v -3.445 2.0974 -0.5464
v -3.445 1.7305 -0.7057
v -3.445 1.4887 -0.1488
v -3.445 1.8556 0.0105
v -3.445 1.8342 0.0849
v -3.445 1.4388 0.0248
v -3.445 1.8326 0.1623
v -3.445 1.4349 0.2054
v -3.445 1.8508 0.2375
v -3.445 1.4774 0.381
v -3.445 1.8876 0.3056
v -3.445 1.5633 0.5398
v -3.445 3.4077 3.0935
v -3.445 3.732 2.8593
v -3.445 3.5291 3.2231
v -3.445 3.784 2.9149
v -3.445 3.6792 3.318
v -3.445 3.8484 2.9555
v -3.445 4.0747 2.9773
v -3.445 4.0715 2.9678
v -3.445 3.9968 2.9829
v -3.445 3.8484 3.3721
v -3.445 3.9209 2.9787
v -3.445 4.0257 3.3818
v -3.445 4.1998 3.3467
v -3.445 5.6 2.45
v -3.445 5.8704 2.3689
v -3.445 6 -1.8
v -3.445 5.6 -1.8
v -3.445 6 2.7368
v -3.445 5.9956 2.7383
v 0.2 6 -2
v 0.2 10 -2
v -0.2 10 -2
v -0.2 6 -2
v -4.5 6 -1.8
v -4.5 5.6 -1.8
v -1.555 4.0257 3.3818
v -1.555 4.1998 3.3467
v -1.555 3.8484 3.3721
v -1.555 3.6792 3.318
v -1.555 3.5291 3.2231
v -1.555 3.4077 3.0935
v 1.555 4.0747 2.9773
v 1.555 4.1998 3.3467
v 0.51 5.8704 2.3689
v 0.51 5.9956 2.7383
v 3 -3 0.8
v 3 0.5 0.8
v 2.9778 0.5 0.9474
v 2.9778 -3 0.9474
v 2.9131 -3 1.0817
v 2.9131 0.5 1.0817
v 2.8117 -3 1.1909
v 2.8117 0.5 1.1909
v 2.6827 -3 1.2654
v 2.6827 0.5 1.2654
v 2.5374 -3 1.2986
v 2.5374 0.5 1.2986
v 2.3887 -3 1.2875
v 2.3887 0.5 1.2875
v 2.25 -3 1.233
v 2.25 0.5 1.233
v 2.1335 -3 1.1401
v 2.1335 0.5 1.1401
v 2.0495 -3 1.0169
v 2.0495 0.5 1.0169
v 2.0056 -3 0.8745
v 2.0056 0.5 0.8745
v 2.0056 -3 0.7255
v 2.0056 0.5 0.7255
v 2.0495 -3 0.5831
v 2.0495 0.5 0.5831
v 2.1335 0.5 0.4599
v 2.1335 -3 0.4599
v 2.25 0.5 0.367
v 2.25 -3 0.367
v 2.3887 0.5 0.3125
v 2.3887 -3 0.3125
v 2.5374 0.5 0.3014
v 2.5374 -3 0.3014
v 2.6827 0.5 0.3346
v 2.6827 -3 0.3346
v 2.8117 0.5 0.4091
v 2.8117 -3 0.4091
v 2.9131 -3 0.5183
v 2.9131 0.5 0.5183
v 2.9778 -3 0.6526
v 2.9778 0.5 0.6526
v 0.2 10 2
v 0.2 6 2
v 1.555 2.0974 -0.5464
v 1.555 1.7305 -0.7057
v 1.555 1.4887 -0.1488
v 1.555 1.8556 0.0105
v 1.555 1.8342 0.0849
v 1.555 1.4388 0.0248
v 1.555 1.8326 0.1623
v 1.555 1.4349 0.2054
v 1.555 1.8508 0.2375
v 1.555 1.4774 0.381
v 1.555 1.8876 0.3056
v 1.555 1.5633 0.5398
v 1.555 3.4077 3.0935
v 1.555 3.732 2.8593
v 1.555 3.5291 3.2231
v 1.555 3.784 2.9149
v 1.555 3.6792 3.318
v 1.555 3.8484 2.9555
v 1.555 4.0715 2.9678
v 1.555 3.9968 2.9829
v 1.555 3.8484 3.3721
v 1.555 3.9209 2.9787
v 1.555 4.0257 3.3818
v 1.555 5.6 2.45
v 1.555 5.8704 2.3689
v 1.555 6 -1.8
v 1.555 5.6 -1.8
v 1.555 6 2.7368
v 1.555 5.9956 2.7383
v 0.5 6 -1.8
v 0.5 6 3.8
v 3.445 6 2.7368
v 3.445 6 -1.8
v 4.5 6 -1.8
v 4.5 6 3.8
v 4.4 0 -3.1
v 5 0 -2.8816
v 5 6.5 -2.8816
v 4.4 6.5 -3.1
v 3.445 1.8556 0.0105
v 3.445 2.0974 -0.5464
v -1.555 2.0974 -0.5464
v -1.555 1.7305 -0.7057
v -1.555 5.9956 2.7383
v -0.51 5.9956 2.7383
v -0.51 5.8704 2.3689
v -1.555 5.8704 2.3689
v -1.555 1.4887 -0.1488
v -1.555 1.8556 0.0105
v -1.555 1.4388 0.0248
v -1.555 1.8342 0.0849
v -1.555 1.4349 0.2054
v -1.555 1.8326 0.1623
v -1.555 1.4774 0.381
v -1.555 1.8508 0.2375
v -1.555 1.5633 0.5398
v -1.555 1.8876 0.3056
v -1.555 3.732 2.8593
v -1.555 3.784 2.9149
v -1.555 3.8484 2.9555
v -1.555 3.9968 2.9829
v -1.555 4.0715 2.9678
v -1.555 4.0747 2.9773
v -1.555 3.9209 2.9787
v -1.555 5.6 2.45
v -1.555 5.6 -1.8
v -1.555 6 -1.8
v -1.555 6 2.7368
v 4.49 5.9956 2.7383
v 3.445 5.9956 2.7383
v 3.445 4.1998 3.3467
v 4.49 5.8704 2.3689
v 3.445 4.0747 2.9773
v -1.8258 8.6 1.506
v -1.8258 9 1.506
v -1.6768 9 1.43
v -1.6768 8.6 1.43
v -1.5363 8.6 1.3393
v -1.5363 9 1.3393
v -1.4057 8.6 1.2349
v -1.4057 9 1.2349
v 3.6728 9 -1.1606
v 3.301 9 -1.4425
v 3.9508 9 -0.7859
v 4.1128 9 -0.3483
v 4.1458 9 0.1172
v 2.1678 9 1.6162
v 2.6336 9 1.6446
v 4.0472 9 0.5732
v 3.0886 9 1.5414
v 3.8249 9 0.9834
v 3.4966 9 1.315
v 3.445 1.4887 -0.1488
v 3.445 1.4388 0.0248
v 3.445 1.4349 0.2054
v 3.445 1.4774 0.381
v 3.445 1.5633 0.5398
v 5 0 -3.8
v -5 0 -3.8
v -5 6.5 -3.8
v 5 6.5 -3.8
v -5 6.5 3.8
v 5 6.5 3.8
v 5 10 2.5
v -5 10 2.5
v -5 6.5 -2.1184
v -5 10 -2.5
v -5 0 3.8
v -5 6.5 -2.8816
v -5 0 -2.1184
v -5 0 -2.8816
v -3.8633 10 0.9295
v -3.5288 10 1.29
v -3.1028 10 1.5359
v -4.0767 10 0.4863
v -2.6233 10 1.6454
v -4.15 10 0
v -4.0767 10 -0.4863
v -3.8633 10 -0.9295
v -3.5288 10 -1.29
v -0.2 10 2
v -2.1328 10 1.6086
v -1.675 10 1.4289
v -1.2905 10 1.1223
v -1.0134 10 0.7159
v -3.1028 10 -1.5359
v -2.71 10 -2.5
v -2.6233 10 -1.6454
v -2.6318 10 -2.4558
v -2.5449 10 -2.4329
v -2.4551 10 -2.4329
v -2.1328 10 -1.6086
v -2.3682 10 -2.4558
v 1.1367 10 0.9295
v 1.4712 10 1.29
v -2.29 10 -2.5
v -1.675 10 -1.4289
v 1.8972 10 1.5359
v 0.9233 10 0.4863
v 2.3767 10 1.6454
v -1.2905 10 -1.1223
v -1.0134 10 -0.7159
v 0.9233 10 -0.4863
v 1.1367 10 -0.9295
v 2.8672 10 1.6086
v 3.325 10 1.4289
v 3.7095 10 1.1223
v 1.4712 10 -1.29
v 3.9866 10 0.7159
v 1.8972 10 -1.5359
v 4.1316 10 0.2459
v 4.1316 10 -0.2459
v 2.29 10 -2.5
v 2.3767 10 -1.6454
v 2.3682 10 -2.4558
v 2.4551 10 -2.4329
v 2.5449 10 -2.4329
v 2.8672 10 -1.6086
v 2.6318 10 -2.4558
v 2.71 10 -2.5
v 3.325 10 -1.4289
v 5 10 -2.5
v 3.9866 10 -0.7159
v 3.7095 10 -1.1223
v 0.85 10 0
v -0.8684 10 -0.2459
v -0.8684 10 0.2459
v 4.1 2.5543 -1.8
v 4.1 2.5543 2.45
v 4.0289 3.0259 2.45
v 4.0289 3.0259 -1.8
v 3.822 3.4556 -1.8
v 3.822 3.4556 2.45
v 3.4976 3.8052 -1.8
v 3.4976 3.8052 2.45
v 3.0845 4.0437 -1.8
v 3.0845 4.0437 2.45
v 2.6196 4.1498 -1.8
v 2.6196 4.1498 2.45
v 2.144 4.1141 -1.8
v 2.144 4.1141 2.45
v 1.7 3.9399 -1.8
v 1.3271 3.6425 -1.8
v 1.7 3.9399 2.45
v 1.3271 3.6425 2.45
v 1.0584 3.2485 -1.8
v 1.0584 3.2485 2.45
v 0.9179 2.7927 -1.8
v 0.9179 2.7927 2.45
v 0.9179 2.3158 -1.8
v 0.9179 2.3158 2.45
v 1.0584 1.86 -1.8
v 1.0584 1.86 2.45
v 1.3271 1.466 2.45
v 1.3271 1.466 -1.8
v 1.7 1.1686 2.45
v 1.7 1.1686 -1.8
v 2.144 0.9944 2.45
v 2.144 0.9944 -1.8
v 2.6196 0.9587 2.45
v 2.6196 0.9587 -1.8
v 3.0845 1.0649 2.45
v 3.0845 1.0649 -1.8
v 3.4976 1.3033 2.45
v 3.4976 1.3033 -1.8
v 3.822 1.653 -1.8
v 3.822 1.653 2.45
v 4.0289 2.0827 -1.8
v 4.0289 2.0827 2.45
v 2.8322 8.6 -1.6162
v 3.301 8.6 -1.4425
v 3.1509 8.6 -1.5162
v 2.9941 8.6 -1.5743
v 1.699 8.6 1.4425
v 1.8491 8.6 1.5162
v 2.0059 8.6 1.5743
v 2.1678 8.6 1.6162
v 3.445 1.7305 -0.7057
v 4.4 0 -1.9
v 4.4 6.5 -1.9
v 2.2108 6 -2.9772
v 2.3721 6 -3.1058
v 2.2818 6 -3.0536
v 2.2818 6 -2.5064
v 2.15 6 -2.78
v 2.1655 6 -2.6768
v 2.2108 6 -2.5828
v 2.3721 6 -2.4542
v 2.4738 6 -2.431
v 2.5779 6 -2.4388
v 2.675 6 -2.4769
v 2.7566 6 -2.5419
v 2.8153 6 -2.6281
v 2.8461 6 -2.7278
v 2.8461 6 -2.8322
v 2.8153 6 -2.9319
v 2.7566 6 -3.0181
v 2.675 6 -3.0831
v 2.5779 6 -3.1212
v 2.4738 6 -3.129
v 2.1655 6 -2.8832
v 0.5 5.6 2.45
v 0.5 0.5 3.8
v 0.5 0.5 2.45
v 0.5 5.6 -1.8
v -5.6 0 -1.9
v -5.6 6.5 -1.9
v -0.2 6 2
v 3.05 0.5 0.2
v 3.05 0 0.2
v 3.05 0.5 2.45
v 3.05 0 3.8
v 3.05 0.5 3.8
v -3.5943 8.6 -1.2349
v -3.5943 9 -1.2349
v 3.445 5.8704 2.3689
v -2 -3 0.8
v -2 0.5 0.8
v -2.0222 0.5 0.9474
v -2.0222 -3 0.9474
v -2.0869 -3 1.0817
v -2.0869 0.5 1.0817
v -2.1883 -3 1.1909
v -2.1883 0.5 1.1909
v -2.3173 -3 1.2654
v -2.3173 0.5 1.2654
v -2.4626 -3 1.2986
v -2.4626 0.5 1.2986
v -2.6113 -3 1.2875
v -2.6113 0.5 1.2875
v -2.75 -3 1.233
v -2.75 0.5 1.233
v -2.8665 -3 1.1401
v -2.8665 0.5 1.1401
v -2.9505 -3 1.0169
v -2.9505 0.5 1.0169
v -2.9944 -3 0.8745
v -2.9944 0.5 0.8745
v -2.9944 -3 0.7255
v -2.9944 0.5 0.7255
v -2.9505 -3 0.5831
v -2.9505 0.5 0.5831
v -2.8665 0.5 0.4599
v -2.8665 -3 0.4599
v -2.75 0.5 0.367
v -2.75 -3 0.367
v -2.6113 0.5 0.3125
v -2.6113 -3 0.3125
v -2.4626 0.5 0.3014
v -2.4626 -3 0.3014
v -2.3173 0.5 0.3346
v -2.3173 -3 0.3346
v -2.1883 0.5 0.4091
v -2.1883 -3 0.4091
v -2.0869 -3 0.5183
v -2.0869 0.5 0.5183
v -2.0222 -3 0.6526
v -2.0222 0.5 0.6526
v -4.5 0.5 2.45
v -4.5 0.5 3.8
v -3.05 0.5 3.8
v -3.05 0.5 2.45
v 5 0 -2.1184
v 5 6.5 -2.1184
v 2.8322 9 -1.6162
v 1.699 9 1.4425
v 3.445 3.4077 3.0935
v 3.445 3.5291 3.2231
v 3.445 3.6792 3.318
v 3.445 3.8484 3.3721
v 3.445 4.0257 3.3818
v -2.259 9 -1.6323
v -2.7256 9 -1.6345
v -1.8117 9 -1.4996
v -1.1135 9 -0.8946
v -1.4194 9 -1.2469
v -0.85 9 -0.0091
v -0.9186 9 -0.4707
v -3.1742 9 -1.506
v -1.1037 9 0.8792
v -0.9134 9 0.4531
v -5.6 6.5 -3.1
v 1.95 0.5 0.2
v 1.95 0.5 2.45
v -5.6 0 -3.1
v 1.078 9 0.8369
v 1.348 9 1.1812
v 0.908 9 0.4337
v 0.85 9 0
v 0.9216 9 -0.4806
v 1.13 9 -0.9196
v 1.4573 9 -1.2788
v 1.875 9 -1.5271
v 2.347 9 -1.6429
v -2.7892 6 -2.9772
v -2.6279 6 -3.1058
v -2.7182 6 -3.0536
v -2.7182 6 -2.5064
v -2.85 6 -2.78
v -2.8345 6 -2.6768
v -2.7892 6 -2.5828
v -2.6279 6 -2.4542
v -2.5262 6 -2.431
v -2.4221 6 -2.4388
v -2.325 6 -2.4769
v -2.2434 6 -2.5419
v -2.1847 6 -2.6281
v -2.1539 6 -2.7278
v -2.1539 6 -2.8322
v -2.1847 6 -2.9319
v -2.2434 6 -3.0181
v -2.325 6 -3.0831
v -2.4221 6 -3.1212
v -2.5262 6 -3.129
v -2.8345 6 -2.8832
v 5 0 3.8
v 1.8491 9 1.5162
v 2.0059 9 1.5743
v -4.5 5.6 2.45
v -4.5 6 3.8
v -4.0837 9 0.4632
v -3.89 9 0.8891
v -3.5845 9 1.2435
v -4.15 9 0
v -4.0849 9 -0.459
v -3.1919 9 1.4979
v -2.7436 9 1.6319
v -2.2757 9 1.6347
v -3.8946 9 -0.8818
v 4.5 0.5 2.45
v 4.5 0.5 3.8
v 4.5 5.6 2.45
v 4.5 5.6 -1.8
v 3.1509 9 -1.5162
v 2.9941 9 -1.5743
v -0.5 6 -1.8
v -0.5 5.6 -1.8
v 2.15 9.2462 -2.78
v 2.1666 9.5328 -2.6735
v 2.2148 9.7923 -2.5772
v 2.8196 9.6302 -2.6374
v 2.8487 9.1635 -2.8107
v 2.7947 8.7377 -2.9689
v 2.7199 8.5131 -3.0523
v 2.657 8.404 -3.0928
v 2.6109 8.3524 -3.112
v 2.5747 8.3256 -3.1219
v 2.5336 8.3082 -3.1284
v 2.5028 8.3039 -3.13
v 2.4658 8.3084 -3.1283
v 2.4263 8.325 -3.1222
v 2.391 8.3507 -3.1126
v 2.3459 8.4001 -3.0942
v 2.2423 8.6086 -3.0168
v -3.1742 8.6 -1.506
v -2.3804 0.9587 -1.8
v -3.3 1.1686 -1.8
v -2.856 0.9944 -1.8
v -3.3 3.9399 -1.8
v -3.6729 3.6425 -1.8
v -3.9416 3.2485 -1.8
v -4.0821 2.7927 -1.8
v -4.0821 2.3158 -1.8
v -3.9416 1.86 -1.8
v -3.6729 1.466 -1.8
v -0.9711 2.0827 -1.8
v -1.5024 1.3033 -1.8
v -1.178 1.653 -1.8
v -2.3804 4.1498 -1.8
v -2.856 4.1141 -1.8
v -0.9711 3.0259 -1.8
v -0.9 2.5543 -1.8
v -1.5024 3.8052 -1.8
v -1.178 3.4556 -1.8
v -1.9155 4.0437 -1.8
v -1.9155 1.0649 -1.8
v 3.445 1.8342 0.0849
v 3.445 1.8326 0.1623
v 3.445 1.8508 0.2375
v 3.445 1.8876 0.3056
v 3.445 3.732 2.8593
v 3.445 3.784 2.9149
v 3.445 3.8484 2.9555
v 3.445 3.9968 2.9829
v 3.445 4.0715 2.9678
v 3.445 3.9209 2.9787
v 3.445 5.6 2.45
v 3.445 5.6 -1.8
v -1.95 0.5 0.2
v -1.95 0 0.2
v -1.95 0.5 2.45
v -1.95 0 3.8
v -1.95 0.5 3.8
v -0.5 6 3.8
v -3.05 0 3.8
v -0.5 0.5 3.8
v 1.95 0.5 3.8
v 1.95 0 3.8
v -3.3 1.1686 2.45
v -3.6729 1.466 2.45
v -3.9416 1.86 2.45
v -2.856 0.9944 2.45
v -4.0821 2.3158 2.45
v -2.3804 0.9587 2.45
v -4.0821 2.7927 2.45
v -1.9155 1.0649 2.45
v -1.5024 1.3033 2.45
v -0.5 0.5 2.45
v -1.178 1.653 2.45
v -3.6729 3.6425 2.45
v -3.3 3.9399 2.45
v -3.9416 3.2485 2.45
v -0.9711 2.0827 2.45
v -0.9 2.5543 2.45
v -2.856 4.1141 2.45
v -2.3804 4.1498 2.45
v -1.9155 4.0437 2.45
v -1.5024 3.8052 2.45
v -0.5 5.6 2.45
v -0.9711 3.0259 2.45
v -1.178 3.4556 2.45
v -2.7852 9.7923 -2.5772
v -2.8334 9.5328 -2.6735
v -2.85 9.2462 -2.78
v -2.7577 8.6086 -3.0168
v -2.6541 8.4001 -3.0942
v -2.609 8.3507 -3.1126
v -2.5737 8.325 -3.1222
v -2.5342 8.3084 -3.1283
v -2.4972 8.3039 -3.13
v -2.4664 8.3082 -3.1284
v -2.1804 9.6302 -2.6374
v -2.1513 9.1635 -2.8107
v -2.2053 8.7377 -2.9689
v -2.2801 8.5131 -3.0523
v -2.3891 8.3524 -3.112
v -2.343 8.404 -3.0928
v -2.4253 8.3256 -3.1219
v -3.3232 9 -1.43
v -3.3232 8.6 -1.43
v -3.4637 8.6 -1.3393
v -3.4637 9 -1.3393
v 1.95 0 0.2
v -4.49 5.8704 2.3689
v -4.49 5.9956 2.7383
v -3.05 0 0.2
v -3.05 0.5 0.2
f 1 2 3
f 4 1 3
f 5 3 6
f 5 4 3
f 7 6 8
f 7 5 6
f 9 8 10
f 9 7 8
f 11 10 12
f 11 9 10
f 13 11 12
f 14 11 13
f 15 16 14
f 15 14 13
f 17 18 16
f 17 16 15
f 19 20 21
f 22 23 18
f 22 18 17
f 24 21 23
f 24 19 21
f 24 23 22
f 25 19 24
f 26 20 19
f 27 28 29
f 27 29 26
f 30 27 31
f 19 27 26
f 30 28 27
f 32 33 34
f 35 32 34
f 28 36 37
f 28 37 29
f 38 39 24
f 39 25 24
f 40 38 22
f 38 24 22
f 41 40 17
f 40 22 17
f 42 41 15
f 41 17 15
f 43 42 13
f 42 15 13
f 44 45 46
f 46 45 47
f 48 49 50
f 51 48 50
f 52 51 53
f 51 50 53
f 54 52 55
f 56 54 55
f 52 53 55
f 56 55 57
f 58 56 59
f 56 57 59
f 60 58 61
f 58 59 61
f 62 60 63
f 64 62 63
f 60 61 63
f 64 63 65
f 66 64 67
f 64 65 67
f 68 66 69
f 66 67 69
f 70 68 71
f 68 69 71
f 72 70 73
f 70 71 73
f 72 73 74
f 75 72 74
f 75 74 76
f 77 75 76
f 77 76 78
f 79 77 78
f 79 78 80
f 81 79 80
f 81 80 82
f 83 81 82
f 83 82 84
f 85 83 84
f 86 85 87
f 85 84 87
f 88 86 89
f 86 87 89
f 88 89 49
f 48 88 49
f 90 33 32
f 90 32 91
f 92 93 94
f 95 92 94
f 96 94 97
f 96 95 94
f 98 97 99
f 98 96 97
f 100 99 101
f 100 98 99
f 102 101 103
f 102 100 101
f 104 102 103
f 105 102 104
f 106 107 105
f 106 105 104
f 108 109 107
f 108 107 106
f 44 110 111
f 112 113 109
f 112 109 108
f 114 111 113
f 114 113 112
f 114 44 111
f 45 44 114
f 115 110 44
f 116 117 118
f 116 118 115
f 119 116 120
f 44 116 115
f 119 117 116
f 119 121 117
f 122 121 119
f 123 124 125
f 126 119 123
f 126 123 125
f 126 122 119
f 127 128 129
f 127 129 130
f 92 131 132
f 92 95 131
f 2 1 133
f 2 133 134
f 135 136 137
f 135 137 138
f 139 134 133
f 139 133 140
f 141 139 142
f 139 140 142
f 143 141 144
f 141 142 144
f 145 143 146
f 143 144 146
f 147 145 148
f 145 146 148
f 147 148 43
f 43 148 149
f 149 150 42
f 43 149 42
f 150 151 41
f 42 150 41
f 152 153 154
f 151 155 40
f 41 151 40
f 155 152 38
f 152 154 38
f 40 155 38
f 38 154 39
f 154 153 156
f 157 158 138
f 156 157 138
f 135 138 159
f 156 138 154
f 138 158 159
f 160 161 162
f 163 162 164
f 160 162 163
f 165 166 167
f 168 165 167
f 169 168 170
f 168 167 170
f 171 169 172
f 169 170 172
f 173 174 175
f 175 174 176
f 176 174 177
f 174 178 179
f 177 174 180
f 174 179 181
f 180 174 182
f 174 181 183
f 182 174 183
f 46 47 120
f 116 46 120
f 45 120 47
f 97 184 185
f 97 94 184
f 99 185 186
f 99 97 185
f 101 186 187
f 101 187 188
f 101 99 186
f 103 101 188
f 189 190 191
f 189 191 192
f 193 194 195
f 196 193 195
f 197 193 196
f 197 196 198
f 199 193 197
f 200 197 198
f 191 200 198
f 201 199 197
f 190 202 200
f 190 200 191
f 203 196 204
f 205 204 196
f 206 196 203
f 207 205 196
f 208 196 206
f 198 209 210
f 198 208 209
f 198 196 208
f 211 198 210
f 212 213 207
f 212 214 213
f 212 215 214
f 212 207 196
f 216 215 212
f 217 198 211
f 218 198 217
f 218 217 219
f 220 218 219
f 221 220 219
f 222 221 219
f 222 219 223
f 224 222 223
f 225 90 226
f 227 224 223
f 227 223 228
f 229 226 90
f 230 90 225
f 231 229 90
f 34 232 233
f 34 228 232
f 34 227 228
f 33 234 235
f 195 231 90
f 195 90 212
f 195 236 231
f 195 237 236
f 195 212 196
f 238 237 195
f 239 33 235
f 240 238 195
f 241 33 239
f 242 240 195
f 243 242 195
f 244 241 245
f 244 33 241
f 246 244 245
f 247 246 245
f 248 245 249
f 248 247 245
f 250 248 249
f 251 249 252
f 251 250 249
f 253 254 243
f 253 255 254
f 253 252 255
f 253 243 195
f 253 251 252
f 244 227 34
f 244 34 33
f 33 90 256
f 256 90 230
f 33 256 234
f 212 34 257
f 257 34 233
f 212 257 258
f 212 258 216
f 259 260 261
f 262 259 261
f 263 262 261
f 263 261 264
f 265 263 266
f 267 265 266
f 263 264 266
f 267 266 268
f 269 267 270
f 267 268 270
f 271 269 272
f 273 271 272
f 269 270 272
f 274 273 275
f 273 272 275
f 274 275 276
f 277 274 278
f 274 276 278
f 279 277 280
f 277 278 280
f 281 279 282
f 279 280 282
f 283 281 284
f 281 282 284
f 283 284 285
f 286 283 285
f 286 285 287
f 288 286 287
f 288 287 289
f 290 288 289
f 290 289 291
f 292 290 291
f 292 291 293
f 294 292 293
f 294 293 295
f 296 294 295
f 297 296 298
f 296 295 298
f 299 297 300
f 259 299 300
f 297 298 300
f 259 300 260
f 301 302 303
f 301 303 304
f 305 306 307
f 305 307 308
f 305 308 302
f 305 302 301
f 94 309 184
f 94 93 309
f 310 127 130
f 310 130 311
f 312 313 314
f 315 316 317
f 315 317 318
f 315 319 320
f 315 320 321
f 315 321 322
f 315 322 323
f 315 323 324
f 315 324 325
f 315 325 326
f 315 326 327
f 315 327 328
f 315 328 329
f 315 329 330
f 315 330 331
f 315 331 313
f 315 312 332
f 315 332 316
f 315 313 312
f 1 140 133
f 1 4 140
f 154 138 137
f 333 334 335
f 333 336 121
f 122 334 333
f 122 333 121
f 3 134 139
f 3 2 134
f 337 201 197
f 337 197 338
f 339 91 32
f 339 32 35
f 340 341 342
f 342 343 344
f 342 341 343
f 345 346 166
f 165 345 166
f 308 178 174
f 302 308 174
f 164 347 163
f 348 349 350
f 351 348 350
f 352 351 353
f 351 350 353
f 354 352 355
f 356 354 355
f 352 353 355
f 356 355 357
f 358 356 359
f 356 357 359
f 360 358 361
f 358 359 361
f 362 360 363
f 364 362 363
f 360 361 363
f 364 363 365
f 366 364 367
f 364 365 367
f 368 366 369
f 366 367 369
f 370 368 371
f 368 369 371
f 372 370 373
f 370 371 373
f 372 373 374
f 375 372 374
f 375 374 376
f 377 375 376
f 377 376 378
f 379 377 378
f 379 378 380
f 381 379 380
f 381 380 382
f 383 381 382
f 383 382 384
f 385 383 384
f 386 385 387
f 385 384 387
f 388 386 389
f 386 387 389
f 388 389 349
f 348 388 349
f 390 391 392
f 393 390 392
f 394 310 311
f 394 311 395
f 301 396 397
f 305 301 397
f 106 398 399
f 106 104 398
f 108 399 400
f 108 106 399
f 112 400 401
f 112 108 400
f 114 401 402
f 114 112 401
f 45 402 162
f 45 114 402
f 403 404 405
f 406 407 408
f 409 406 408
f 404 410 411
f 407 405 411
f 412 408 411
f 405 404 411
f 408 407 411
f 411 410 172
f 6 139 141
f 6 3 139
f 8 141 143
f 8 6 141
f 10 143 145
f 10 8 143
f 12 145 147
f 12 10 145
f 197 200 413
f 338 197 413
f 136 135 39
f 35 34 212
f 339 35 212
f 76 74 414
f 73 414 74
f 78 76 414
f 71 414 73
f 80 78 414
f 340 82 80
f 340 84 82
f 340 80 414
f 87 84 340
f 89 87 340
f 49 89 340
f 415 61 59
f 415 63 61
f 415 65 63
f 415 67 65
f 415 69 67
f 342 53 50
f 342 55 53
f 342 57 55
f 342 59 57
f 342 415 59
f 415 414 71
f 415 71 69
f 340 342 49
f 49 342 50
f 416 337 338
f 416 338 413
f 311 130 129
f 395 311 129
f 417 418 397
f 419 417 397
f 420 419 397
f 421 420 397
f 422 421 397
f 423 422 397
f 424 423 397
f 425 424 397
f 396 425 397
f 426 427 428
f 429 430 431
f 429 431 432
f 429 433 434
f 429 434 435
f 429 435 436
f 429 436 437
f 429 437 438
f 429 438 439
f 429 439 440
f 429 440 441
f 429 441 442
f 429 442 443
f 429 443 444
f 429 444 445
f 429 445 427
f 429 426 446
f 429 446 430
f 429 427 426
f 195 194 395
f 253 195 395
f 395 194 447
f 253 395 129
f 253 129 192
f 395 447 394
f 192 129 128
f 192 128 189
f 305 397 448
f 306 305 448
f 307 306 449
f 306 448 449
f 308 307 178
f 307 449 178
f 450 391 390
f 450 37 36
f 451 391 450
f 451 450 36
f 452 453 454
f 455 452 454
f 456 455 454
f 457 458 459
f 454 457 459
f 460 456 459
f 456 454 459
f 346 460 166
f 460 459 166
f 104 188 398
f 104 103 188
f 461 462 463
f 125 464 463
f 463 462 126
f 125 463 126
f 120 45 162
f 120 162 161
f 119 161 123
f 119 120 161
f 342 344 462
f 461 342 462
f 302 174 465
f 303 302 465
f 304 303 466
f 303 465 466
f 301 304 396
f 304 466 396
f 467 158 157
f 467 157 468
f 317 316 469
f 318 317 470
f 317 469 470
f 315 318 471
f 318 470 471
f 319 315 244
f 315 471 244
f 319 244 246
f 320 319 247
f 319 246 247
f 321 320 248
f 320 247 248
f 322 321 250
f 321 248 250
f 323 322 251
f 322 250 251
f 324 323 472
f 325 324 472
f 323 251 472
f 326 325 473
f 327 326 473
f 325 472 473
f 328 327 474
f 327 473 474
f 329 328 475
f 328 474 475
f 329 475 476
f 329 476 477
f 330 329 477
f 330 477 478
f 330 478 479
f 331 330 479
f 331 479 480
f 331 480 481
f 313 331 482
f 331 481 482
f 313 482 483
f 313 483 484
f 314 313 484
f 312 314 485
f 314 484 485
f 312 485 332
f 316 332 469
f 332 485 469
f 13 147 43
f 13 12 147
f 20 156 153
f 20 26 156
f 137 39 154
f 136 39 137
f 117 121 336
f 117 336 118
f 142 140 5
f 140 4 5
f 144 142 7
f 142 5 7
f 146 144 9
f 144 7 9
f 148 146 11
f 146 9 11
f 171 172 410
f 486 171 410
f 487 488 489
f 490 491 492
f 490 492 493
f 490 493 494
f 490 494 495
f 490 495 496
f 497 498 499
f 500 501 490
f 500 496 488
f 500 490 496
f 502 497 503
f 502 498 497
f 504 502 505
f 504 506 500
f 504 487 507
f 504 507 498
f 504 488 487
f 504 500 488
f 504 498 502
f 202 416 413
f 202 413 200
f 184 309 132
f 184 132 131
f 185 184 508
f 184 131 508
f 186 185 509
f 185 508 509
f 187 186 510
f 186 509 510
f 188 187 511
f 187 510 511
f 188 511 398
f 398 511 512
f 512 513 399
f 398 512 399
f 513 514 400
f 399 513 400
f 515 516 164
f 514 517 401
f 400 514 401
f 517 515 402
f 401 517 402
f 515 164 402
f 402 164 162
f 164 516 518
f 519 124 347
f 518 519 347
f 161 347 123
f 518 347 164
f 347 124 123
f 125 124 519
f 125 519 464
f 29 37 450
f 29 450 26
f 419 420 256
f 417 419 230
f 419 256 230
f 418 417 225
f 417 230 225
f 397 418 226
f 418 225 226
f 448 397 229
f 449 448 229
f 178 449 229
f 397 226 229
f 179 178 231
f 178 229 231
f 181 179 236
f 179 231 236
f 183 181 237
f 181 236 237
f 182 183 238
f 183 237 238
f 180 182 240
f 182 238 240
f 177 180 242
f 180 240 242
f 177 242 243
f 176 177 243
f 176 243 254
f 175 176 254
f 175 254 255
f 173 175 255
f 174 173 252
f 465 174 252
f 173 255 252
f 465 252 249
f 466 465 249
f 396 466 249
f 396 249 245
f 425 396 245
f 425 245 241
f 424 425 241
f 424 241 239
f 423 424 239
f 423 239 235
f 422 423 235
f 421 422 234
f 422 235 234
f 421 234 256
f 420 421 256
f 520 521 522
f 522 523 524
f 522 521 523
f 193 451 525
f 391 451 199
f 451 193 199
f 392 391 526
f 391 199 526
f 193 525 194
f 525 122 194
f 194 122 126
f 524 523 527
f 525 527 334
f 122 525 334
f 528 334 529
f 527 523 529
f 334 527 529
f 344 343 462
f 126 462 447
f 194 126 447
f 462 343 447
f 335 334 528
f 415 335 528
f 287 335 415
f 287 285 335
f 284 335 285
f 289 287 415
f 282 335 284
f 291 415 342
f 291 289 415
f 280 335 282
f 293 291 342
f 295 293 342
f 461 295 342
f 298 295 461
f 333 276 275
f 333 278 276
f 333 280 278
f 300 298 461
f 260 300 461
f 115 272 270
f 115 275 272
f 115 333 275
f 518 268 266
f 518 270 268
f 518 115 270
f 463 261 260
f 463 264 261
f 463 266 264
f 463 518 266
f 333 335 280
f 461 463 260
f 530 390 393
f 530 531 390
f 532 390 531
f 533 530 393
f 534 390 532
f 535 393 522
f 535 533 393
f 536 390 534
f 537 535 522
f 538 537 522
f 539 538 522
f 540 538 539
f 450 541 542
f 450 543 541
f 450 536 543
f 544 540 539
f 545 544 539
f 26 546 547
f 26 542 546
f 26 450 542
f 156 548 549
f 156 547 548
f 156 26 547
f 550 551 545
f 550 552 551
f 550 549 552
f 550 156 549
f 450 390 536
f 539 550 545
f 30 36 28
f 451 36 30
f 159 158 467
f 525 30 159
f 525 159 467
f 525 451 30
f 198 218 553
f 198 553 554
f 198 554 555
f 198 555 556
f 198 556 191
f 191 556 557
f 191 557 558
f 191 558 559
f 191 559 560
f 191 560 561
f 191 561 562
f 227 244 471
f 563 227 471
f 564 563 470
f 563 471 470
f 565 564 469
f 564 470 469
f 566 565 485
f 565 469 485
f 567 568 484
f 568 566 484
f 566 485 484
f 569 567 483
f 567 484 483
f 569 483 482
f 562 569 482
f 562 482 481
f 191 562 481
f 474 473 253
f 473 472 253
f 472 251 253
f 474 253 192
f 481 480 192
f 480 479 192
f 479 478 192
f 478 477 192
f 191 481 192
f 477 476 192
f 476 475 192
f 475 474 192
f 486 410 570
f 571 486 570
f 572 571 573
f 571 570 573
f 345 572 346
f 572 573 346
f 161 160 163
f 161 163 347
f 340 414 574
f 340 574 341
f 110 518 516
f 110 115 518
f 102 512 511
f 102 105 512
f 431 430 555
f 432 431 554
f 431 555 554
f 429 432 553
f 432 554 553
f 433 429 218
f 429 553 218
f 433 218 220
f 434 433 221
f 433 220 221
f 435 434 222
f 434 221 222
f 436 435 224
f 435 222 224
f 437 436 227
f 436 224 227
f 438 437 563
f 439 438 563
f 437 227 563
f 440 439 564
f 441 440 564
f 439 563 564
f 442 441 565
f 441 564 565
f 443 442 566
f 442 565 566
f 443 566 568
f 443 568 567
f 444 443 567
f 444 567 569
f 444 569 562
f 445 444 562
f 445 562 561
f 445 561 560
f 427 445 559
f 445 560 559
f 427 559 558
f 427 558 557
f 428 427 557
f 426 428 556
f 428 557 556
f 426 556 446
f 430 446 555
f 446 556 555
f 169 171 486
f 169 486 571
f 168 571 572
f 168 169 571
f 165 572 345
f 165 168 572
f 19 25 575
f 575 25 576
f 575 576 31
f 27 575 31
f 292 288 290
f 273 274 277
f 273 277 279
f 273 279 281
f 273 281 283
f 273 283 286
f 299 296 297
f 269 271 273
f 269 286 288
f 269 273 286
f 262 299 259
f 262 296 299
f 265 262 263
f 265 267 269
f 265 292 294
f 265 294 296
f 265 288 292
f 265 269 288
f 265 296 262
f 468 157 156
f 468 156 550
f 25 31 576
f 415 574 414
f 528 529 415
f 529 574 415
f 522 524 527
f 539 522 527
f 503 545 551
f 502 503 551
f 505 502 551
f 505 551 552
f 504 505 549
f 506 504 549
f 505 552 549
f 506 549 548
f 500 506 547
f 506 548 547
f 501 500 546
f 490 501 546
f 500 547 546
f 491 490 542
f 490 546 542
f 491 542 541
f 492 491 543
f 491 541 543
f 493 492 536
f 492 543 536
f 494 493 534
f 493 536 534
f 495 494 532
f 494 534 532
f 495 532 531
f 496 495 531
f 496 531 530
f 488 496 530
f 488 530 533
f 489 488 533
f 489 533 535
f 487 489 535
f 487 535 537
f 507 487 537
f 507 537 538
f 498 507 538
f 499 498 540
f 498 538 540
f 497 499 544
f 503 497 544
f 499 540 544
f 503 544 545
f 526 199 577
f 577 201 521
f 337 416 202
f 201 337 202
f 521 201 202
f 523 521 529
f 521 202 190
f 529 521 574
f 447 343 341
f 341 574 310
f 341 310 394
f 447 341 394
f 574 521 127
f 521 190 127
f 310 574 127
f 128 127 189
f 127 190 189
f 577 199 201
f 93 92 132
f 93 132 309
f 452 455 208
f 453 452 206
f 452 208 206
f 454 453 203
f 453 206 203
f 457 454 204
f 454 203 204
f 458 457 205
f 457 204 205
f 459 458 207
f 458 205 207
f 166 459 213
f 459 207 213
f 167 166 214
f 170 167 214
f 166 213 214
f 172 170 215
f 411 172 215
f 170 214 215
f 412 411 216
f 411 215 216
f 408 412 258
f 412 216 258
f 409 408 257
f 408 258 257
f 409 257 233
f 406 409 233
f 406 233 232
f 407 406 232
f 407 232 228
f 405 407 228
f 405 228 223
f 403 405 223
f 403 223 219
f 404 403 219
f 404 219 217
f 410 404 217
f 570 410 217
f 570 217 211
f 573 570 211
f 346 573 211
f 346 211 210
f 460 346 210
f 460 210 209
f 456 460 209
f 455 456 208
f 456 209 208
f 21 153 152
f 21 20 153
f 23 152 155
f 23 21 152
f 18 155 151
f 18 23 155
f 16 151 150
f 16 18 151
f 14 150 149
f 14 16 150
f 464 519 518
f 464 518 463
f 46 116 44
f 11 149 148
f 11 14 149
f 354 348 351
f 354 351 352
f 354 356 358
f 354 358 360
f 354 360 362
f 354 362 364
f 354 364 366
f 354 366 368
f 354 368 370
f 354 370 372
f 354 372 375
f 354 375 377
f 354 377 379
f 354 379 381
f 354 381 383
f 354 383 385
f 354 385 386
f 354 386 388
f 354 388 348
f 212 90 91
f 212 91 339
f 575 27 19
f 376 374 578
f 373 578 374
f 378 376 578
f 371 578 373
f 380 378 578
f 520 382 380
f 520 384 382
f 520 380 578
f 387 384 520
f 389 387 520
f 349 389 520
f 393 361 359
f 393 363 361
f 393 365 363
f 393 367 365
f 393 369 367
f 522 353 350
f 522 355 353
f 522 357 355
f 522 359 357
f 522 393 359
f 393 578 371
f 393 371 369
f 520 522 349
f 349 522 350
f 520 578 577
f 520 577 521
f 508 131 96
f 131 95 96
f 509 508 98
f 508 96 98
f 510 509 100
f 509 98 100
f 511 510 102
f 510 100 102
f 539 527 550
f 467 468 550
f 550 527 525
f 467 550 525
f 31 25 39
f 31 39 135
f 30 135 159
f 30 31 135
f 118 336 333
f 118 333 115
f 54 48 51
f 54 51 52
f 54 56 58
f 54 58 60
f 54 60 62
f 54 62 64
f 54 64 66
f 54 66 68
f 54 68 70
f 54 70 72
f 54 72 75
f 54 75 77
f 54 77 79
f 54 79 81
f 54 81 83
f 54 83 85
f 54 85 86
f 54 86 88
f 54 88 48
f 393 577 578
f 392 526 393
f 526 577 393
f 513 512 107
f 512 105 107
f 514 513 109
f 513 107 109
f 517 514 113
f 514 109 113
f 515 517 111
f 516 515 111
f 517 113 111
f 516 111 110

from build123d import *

# Parameters (mm, degrees)
SKETCH1_W               = 10
SKETCH1_H               = 7.6
EXTRUDE1_DEPTH          = 10
SKETCH2_OUTSIDE_W       = 12.81
SKETCH2_OUTSIDE_H       = 15.21
CUT_EXTRUDE1_DEPTH      = 6
CUT_EXTRUDE1_DEPTH_BACK = 6
SKETCH3_R               = 1.65
SKETCH3_R_2             = 0.35
SKETCH3_W               = 0.4
SKETCH3_H               = 4
CUT_EXTRUDE2_DEPTH      = 4
SKETCH4_W               = 4
SKETCH4_H               = 5.5
CUT_EXTRUDE3_DEPTH      = 5.6
SKETCH5_W               = 4
SKETCH5_H               = 5.1
EXTRUDE2_DEPTH          = 4.25
SKETCH6_R               = 1.6
CUT_EXTRUDE4_DEPTH      = 4.25
EXTRUDE3_DEPTH          = 6.5
CUT_EXTRUDE5_DEPTH      = 6.5
SKETCH10_W              = 1.1
SKETCH10_H              = 0.5
CUT_EXTRUDE6_DEPTH      = 3.6
SKETCH11_R              = 0.5
EXTRUDE4_DEPTH          = 3.5
SKETCH12_R              = 1.65
EXTRUDE5_DEPTH          = 3
CUT_EXTRUDE7_DEPTH      = 0.4
EXTRUDE6_DEPTH          = 0.945
EXTRUDE9_DEPTH          = 0.39
LPATTERN1_COUNT         = 2
LPATTERN1_PITCH         = 5
FILLET1_R               = 0.3
FILLET2_R               = 0.7


with BuildPart() as part:
    # Sketch1 → Extrude1 (new body)
    with BuildSketch(Plane(origin=(0, 0, 0), x_dir=(1, 0, 0), z_dir=(0, 1, 0))):
        Rectangle(SKETCH1_W, SKETCH1_H)
    extrude(amount=EXTRUDE1_DEPTH)

    # Sketch2 outside → Cut-Extrude1 (cut, two sides)
    with BuildSketch(Plane(origin=(0, 0, 0), x_dir=(0, 0, -1), z_dir=(1, 0, 0))) as cut_extrude1_sk:
        with Locations((0, 5)):
            Rectangle(SKETCH2_OUTSIDE_W, SKETCH2_OUTSIDE_H)
        Polygon((2.5, 10), (3.8, 6.5), (3.8, 0), (-3.8, 0), (-3.8, 6.5), (-2.5, 10), align=None, mode=Mode.SUBTRACT)
    extrude(amount=CUT_EXTRUDE1_DEPTH, mode=Mode.SUBTRACT)
    extrude(cut_extrude1_sk.sketch, amount=-CUT_EXTRUDE1_DEPTH_BACK, mode=Mode.SUBTRACT)

    # Sketch3 → Cut-Extrude2 (cut)
    with BuildSketch(Plane(origin=(0, 10, 0), x_dir=(-1, 0, 0), z_dir=(0, 1, 0))):
        with Locations((2.5, 0)):
            Circle(SKETCH3_R)
        with Locations((-2.5, 0)):
            Circle(SKETCH3_R)
        with Locations((2.5, -2.78)):
            Circle(SKETCH3_R_2)
        with Locations((-2.5, -2.78)):
            Circle(SKETCH3_R_2)
        Rectangle(SKETCH3_W, SKETCH3_H)
    extrude(amount=-CUT_EXTRUDE2_DEPTH, mode=Mode.SUBTRACT)

    # Sketch4 → Cut-Extrude3 (cut)
    with BuildSketch(Plane.XY.offset(3.8)):
        with Locations((-2.5, 3.25)):
            Rectangle(SKETCH4_W, SKETCH4_H)
        with Locations((2.5, 3.25)):
            Rectangle(SKETCH4_W, SKETCH4_H)
    extrude(amount=-CUT_EXTRUDE3_DEPTH, mode=Mode.SUBTRACT)

    # Sketch5 → Extrude2 (add)
    with BuildSketch(Plane.XY.offset(-1.8)):
        with Locations((-2.5, 3.05)):
            Rectangle(SKETCH5_W, SKETCH5_H)
        with Locations((2.5, 3.05)):
            Rectangle(SKETCH5_W, SKETCH5_H)
    extrude(amount=EXTRUDE2_DEPTH)

    # Sketch6 → Cut-Extrude4 (cut)
    with BuildSketch(Plane.XY.offset(2.45)):
        with Locations((-2.5, 2.554263468)):
            Circle(SKETCH6_R)
        with Locations((2.5, 2.554263468)):
            Circle(SKETCH6_R)
    extrude(amount=-CUT_EXTRUDE4_DEPTH, mode=Mode.SUBTRACT)

    # Sketch7 → Extrude3 (add)
    with BuildSketch(Plane(origin=(0, 0, 0), x_dir=(1, 0, 0), z_dir=(0, 1, 0))):
        Polygon((-5.6, 3.1), (-5, 2.881617859), (-5, 2.118382141), (-5.6, 1.9), align=None)
    extrude(amount=EXTRUDE3_DEPTH)

    # Sketch9 → Cut-Extrude5 (cut)
    with BuildSketch(Plane(origin=(0, 0, 0), x_dir=(1, 0, 0), z_dir=(0, 1, 0))):
        Polygon((5, 2.881617859), (4.4, 3.1), (4.4, 1.9), (5, 2.118382141), align=None)
    extrude(amount=CUT_EXTRUDE5_DEPTH, mode=Mode.SUBTRACT)

    # Sketch10 → Cut-Extrude6 (cut)
    with BuildSketch(Plane.XY.offset(3.8)):
        with Locations((-2.5, 0.25)):
            Rectangle(SKETCH10_W, SKETCH10_H)
        with Locations((2.5, 0.25)):
            Rectangle(SKETCH10_W, SKETCH10_H)
    extrude(amount=-CUT_EXTRUDE6_DEPTH, mode=Mode.SUBTRACT)

    # Sketch11 → Extrude4 (add)
    with BuildSketch(Plane.XZ.offset(-0.5)):
        with Locations((-2.5, 0.8)):
            Circle(SKETCH11_R)
        with Locations((2.5, 0.8)):
            Circle(SKETCH11_R)
    extrude(amount=EXTRUDE4_DEPTH)

    # Sketch12 → Extrude5 (add)
    with BuildSketch(Plane.XZ.offset(-6)):
        with Locations((2.5, 0)):
            Circle(SKETCH12_R)
        with Locations((-2.5, 0)):
            Circle(SKETCH12_R)
    extrude(amount=-EXTRUDE5_DEPTH)

    # Sketch13 → Cut-Extrude7 (cut)
    with BuildSketch(Plane(origin=(0, 9, 0), x_dir=(-1, 0, 0), z_dir=(0, 1, 0))):
        with BuildLine():
            Line((3.594307251, -1.234905519), (1.825829895, 1.505986278))
            ThreePointArc((1.825829895, 1.505986278), (1.605433494, 1.386452583), (1.405692749, 1.234905519))
            Line((1.405692749, 1.234905519), (3.174170105, -1.505986278))
            ThreePointArc((3.174170105, -1.505986278), (3.394566506, -1.386452583), (3.594307251, -1.234905519))
        make_face()
        with BuildLine():
            Line((-2.83217089, -1.616218581), (-1.698971441, 1.44251629))
            ThreePointArc((-1.698971441, 1.44251629), (-1.926782442, 1.54723031), (-2.16782911, 1.616218581))
            Line((-2.16782911, 1.616218581), (-3.301028559, -1.44251629))
            ThreePointArc((-3.301028559, -1.44251629), (-3.073217558, -1.54723031), (-2.83217089, -1.616218581))
        make_face()
    extrude(amount=-CUT_EXTRUDE7_DEPTH, mode=Mode.SUBTRACT)

    # Sketch14 → Extrude6 (add, symmetric)
    with BuildSketch(Plane.ZY.offset(2.5)):
        Polygon((2.45, 5.6), (3.03887637, 3.861674443), (0.167170254, 1.787608865), (-0.546359637, 2.097431054), (-0.705673534, 1.730526322), (0.216750724, 1.33), (3.512480259, 3.710312924), (2.736824279, 6), (-1.8, 6), (-1.8, 5.6), align=None)
    extrude6 = extrude(amount=EXTRUDE6_DEPTH, both=True)

    # Sketch15 → Extrude9 (add)
    with BuildSketch(Plane(origin=(0, 1.449355072, 4.278403908), x_dir=(1, 0, 0), z_dir=(0, 0.320850379, 0.947129893))):
        Polygon((-1.555, 4.8), (-1.555, 2.903968921), (-0.51, 4.8), align=None)
        Polygon((-3.445, 4.8), (-3.445, 2.903968921), (-4.49, 4.8), align=None)
    extrude9 = extrude(amount=-EXTRUDE9_DEPTH)

    # LPattern1: Extrude6, Extrude9 ×2
    with Locations(*[(i * LPATTERN1_PITCH, 0, 0) for i in range(1, LPATTERN1_COUNT)]):
        add(extrude6)
        add(extrude9)

    # Fillet1
    fillet1_edges = [part.edges().sort_by_distance(p)[0] for p in [
        (-2.5, 3.861674443, 3.03887637),
        (-2.5, 1.787608865, 0.167170254),
        (2.5, 3.861674443, 3.03887637),
        (2.5, 1.787608865, 0.167170254),
    ]]
    fillet(fillet1_edges, radius=FILLET1_R)

    # Fillet2
    fillet2_edges = [part.edges().sort_by_distance(p)[0] for p in [
        (-2.5, 3.710312924, 3.512480259),
        (-2.5, 1.33, 0.216750724),
        (2.5, 1.33, 0.216750724),
        (2.5, 3.710312924, 3.512480259),
    ]]
    fillet(fillet2_edges, radius=FILLET2_R)


solid = part.part
